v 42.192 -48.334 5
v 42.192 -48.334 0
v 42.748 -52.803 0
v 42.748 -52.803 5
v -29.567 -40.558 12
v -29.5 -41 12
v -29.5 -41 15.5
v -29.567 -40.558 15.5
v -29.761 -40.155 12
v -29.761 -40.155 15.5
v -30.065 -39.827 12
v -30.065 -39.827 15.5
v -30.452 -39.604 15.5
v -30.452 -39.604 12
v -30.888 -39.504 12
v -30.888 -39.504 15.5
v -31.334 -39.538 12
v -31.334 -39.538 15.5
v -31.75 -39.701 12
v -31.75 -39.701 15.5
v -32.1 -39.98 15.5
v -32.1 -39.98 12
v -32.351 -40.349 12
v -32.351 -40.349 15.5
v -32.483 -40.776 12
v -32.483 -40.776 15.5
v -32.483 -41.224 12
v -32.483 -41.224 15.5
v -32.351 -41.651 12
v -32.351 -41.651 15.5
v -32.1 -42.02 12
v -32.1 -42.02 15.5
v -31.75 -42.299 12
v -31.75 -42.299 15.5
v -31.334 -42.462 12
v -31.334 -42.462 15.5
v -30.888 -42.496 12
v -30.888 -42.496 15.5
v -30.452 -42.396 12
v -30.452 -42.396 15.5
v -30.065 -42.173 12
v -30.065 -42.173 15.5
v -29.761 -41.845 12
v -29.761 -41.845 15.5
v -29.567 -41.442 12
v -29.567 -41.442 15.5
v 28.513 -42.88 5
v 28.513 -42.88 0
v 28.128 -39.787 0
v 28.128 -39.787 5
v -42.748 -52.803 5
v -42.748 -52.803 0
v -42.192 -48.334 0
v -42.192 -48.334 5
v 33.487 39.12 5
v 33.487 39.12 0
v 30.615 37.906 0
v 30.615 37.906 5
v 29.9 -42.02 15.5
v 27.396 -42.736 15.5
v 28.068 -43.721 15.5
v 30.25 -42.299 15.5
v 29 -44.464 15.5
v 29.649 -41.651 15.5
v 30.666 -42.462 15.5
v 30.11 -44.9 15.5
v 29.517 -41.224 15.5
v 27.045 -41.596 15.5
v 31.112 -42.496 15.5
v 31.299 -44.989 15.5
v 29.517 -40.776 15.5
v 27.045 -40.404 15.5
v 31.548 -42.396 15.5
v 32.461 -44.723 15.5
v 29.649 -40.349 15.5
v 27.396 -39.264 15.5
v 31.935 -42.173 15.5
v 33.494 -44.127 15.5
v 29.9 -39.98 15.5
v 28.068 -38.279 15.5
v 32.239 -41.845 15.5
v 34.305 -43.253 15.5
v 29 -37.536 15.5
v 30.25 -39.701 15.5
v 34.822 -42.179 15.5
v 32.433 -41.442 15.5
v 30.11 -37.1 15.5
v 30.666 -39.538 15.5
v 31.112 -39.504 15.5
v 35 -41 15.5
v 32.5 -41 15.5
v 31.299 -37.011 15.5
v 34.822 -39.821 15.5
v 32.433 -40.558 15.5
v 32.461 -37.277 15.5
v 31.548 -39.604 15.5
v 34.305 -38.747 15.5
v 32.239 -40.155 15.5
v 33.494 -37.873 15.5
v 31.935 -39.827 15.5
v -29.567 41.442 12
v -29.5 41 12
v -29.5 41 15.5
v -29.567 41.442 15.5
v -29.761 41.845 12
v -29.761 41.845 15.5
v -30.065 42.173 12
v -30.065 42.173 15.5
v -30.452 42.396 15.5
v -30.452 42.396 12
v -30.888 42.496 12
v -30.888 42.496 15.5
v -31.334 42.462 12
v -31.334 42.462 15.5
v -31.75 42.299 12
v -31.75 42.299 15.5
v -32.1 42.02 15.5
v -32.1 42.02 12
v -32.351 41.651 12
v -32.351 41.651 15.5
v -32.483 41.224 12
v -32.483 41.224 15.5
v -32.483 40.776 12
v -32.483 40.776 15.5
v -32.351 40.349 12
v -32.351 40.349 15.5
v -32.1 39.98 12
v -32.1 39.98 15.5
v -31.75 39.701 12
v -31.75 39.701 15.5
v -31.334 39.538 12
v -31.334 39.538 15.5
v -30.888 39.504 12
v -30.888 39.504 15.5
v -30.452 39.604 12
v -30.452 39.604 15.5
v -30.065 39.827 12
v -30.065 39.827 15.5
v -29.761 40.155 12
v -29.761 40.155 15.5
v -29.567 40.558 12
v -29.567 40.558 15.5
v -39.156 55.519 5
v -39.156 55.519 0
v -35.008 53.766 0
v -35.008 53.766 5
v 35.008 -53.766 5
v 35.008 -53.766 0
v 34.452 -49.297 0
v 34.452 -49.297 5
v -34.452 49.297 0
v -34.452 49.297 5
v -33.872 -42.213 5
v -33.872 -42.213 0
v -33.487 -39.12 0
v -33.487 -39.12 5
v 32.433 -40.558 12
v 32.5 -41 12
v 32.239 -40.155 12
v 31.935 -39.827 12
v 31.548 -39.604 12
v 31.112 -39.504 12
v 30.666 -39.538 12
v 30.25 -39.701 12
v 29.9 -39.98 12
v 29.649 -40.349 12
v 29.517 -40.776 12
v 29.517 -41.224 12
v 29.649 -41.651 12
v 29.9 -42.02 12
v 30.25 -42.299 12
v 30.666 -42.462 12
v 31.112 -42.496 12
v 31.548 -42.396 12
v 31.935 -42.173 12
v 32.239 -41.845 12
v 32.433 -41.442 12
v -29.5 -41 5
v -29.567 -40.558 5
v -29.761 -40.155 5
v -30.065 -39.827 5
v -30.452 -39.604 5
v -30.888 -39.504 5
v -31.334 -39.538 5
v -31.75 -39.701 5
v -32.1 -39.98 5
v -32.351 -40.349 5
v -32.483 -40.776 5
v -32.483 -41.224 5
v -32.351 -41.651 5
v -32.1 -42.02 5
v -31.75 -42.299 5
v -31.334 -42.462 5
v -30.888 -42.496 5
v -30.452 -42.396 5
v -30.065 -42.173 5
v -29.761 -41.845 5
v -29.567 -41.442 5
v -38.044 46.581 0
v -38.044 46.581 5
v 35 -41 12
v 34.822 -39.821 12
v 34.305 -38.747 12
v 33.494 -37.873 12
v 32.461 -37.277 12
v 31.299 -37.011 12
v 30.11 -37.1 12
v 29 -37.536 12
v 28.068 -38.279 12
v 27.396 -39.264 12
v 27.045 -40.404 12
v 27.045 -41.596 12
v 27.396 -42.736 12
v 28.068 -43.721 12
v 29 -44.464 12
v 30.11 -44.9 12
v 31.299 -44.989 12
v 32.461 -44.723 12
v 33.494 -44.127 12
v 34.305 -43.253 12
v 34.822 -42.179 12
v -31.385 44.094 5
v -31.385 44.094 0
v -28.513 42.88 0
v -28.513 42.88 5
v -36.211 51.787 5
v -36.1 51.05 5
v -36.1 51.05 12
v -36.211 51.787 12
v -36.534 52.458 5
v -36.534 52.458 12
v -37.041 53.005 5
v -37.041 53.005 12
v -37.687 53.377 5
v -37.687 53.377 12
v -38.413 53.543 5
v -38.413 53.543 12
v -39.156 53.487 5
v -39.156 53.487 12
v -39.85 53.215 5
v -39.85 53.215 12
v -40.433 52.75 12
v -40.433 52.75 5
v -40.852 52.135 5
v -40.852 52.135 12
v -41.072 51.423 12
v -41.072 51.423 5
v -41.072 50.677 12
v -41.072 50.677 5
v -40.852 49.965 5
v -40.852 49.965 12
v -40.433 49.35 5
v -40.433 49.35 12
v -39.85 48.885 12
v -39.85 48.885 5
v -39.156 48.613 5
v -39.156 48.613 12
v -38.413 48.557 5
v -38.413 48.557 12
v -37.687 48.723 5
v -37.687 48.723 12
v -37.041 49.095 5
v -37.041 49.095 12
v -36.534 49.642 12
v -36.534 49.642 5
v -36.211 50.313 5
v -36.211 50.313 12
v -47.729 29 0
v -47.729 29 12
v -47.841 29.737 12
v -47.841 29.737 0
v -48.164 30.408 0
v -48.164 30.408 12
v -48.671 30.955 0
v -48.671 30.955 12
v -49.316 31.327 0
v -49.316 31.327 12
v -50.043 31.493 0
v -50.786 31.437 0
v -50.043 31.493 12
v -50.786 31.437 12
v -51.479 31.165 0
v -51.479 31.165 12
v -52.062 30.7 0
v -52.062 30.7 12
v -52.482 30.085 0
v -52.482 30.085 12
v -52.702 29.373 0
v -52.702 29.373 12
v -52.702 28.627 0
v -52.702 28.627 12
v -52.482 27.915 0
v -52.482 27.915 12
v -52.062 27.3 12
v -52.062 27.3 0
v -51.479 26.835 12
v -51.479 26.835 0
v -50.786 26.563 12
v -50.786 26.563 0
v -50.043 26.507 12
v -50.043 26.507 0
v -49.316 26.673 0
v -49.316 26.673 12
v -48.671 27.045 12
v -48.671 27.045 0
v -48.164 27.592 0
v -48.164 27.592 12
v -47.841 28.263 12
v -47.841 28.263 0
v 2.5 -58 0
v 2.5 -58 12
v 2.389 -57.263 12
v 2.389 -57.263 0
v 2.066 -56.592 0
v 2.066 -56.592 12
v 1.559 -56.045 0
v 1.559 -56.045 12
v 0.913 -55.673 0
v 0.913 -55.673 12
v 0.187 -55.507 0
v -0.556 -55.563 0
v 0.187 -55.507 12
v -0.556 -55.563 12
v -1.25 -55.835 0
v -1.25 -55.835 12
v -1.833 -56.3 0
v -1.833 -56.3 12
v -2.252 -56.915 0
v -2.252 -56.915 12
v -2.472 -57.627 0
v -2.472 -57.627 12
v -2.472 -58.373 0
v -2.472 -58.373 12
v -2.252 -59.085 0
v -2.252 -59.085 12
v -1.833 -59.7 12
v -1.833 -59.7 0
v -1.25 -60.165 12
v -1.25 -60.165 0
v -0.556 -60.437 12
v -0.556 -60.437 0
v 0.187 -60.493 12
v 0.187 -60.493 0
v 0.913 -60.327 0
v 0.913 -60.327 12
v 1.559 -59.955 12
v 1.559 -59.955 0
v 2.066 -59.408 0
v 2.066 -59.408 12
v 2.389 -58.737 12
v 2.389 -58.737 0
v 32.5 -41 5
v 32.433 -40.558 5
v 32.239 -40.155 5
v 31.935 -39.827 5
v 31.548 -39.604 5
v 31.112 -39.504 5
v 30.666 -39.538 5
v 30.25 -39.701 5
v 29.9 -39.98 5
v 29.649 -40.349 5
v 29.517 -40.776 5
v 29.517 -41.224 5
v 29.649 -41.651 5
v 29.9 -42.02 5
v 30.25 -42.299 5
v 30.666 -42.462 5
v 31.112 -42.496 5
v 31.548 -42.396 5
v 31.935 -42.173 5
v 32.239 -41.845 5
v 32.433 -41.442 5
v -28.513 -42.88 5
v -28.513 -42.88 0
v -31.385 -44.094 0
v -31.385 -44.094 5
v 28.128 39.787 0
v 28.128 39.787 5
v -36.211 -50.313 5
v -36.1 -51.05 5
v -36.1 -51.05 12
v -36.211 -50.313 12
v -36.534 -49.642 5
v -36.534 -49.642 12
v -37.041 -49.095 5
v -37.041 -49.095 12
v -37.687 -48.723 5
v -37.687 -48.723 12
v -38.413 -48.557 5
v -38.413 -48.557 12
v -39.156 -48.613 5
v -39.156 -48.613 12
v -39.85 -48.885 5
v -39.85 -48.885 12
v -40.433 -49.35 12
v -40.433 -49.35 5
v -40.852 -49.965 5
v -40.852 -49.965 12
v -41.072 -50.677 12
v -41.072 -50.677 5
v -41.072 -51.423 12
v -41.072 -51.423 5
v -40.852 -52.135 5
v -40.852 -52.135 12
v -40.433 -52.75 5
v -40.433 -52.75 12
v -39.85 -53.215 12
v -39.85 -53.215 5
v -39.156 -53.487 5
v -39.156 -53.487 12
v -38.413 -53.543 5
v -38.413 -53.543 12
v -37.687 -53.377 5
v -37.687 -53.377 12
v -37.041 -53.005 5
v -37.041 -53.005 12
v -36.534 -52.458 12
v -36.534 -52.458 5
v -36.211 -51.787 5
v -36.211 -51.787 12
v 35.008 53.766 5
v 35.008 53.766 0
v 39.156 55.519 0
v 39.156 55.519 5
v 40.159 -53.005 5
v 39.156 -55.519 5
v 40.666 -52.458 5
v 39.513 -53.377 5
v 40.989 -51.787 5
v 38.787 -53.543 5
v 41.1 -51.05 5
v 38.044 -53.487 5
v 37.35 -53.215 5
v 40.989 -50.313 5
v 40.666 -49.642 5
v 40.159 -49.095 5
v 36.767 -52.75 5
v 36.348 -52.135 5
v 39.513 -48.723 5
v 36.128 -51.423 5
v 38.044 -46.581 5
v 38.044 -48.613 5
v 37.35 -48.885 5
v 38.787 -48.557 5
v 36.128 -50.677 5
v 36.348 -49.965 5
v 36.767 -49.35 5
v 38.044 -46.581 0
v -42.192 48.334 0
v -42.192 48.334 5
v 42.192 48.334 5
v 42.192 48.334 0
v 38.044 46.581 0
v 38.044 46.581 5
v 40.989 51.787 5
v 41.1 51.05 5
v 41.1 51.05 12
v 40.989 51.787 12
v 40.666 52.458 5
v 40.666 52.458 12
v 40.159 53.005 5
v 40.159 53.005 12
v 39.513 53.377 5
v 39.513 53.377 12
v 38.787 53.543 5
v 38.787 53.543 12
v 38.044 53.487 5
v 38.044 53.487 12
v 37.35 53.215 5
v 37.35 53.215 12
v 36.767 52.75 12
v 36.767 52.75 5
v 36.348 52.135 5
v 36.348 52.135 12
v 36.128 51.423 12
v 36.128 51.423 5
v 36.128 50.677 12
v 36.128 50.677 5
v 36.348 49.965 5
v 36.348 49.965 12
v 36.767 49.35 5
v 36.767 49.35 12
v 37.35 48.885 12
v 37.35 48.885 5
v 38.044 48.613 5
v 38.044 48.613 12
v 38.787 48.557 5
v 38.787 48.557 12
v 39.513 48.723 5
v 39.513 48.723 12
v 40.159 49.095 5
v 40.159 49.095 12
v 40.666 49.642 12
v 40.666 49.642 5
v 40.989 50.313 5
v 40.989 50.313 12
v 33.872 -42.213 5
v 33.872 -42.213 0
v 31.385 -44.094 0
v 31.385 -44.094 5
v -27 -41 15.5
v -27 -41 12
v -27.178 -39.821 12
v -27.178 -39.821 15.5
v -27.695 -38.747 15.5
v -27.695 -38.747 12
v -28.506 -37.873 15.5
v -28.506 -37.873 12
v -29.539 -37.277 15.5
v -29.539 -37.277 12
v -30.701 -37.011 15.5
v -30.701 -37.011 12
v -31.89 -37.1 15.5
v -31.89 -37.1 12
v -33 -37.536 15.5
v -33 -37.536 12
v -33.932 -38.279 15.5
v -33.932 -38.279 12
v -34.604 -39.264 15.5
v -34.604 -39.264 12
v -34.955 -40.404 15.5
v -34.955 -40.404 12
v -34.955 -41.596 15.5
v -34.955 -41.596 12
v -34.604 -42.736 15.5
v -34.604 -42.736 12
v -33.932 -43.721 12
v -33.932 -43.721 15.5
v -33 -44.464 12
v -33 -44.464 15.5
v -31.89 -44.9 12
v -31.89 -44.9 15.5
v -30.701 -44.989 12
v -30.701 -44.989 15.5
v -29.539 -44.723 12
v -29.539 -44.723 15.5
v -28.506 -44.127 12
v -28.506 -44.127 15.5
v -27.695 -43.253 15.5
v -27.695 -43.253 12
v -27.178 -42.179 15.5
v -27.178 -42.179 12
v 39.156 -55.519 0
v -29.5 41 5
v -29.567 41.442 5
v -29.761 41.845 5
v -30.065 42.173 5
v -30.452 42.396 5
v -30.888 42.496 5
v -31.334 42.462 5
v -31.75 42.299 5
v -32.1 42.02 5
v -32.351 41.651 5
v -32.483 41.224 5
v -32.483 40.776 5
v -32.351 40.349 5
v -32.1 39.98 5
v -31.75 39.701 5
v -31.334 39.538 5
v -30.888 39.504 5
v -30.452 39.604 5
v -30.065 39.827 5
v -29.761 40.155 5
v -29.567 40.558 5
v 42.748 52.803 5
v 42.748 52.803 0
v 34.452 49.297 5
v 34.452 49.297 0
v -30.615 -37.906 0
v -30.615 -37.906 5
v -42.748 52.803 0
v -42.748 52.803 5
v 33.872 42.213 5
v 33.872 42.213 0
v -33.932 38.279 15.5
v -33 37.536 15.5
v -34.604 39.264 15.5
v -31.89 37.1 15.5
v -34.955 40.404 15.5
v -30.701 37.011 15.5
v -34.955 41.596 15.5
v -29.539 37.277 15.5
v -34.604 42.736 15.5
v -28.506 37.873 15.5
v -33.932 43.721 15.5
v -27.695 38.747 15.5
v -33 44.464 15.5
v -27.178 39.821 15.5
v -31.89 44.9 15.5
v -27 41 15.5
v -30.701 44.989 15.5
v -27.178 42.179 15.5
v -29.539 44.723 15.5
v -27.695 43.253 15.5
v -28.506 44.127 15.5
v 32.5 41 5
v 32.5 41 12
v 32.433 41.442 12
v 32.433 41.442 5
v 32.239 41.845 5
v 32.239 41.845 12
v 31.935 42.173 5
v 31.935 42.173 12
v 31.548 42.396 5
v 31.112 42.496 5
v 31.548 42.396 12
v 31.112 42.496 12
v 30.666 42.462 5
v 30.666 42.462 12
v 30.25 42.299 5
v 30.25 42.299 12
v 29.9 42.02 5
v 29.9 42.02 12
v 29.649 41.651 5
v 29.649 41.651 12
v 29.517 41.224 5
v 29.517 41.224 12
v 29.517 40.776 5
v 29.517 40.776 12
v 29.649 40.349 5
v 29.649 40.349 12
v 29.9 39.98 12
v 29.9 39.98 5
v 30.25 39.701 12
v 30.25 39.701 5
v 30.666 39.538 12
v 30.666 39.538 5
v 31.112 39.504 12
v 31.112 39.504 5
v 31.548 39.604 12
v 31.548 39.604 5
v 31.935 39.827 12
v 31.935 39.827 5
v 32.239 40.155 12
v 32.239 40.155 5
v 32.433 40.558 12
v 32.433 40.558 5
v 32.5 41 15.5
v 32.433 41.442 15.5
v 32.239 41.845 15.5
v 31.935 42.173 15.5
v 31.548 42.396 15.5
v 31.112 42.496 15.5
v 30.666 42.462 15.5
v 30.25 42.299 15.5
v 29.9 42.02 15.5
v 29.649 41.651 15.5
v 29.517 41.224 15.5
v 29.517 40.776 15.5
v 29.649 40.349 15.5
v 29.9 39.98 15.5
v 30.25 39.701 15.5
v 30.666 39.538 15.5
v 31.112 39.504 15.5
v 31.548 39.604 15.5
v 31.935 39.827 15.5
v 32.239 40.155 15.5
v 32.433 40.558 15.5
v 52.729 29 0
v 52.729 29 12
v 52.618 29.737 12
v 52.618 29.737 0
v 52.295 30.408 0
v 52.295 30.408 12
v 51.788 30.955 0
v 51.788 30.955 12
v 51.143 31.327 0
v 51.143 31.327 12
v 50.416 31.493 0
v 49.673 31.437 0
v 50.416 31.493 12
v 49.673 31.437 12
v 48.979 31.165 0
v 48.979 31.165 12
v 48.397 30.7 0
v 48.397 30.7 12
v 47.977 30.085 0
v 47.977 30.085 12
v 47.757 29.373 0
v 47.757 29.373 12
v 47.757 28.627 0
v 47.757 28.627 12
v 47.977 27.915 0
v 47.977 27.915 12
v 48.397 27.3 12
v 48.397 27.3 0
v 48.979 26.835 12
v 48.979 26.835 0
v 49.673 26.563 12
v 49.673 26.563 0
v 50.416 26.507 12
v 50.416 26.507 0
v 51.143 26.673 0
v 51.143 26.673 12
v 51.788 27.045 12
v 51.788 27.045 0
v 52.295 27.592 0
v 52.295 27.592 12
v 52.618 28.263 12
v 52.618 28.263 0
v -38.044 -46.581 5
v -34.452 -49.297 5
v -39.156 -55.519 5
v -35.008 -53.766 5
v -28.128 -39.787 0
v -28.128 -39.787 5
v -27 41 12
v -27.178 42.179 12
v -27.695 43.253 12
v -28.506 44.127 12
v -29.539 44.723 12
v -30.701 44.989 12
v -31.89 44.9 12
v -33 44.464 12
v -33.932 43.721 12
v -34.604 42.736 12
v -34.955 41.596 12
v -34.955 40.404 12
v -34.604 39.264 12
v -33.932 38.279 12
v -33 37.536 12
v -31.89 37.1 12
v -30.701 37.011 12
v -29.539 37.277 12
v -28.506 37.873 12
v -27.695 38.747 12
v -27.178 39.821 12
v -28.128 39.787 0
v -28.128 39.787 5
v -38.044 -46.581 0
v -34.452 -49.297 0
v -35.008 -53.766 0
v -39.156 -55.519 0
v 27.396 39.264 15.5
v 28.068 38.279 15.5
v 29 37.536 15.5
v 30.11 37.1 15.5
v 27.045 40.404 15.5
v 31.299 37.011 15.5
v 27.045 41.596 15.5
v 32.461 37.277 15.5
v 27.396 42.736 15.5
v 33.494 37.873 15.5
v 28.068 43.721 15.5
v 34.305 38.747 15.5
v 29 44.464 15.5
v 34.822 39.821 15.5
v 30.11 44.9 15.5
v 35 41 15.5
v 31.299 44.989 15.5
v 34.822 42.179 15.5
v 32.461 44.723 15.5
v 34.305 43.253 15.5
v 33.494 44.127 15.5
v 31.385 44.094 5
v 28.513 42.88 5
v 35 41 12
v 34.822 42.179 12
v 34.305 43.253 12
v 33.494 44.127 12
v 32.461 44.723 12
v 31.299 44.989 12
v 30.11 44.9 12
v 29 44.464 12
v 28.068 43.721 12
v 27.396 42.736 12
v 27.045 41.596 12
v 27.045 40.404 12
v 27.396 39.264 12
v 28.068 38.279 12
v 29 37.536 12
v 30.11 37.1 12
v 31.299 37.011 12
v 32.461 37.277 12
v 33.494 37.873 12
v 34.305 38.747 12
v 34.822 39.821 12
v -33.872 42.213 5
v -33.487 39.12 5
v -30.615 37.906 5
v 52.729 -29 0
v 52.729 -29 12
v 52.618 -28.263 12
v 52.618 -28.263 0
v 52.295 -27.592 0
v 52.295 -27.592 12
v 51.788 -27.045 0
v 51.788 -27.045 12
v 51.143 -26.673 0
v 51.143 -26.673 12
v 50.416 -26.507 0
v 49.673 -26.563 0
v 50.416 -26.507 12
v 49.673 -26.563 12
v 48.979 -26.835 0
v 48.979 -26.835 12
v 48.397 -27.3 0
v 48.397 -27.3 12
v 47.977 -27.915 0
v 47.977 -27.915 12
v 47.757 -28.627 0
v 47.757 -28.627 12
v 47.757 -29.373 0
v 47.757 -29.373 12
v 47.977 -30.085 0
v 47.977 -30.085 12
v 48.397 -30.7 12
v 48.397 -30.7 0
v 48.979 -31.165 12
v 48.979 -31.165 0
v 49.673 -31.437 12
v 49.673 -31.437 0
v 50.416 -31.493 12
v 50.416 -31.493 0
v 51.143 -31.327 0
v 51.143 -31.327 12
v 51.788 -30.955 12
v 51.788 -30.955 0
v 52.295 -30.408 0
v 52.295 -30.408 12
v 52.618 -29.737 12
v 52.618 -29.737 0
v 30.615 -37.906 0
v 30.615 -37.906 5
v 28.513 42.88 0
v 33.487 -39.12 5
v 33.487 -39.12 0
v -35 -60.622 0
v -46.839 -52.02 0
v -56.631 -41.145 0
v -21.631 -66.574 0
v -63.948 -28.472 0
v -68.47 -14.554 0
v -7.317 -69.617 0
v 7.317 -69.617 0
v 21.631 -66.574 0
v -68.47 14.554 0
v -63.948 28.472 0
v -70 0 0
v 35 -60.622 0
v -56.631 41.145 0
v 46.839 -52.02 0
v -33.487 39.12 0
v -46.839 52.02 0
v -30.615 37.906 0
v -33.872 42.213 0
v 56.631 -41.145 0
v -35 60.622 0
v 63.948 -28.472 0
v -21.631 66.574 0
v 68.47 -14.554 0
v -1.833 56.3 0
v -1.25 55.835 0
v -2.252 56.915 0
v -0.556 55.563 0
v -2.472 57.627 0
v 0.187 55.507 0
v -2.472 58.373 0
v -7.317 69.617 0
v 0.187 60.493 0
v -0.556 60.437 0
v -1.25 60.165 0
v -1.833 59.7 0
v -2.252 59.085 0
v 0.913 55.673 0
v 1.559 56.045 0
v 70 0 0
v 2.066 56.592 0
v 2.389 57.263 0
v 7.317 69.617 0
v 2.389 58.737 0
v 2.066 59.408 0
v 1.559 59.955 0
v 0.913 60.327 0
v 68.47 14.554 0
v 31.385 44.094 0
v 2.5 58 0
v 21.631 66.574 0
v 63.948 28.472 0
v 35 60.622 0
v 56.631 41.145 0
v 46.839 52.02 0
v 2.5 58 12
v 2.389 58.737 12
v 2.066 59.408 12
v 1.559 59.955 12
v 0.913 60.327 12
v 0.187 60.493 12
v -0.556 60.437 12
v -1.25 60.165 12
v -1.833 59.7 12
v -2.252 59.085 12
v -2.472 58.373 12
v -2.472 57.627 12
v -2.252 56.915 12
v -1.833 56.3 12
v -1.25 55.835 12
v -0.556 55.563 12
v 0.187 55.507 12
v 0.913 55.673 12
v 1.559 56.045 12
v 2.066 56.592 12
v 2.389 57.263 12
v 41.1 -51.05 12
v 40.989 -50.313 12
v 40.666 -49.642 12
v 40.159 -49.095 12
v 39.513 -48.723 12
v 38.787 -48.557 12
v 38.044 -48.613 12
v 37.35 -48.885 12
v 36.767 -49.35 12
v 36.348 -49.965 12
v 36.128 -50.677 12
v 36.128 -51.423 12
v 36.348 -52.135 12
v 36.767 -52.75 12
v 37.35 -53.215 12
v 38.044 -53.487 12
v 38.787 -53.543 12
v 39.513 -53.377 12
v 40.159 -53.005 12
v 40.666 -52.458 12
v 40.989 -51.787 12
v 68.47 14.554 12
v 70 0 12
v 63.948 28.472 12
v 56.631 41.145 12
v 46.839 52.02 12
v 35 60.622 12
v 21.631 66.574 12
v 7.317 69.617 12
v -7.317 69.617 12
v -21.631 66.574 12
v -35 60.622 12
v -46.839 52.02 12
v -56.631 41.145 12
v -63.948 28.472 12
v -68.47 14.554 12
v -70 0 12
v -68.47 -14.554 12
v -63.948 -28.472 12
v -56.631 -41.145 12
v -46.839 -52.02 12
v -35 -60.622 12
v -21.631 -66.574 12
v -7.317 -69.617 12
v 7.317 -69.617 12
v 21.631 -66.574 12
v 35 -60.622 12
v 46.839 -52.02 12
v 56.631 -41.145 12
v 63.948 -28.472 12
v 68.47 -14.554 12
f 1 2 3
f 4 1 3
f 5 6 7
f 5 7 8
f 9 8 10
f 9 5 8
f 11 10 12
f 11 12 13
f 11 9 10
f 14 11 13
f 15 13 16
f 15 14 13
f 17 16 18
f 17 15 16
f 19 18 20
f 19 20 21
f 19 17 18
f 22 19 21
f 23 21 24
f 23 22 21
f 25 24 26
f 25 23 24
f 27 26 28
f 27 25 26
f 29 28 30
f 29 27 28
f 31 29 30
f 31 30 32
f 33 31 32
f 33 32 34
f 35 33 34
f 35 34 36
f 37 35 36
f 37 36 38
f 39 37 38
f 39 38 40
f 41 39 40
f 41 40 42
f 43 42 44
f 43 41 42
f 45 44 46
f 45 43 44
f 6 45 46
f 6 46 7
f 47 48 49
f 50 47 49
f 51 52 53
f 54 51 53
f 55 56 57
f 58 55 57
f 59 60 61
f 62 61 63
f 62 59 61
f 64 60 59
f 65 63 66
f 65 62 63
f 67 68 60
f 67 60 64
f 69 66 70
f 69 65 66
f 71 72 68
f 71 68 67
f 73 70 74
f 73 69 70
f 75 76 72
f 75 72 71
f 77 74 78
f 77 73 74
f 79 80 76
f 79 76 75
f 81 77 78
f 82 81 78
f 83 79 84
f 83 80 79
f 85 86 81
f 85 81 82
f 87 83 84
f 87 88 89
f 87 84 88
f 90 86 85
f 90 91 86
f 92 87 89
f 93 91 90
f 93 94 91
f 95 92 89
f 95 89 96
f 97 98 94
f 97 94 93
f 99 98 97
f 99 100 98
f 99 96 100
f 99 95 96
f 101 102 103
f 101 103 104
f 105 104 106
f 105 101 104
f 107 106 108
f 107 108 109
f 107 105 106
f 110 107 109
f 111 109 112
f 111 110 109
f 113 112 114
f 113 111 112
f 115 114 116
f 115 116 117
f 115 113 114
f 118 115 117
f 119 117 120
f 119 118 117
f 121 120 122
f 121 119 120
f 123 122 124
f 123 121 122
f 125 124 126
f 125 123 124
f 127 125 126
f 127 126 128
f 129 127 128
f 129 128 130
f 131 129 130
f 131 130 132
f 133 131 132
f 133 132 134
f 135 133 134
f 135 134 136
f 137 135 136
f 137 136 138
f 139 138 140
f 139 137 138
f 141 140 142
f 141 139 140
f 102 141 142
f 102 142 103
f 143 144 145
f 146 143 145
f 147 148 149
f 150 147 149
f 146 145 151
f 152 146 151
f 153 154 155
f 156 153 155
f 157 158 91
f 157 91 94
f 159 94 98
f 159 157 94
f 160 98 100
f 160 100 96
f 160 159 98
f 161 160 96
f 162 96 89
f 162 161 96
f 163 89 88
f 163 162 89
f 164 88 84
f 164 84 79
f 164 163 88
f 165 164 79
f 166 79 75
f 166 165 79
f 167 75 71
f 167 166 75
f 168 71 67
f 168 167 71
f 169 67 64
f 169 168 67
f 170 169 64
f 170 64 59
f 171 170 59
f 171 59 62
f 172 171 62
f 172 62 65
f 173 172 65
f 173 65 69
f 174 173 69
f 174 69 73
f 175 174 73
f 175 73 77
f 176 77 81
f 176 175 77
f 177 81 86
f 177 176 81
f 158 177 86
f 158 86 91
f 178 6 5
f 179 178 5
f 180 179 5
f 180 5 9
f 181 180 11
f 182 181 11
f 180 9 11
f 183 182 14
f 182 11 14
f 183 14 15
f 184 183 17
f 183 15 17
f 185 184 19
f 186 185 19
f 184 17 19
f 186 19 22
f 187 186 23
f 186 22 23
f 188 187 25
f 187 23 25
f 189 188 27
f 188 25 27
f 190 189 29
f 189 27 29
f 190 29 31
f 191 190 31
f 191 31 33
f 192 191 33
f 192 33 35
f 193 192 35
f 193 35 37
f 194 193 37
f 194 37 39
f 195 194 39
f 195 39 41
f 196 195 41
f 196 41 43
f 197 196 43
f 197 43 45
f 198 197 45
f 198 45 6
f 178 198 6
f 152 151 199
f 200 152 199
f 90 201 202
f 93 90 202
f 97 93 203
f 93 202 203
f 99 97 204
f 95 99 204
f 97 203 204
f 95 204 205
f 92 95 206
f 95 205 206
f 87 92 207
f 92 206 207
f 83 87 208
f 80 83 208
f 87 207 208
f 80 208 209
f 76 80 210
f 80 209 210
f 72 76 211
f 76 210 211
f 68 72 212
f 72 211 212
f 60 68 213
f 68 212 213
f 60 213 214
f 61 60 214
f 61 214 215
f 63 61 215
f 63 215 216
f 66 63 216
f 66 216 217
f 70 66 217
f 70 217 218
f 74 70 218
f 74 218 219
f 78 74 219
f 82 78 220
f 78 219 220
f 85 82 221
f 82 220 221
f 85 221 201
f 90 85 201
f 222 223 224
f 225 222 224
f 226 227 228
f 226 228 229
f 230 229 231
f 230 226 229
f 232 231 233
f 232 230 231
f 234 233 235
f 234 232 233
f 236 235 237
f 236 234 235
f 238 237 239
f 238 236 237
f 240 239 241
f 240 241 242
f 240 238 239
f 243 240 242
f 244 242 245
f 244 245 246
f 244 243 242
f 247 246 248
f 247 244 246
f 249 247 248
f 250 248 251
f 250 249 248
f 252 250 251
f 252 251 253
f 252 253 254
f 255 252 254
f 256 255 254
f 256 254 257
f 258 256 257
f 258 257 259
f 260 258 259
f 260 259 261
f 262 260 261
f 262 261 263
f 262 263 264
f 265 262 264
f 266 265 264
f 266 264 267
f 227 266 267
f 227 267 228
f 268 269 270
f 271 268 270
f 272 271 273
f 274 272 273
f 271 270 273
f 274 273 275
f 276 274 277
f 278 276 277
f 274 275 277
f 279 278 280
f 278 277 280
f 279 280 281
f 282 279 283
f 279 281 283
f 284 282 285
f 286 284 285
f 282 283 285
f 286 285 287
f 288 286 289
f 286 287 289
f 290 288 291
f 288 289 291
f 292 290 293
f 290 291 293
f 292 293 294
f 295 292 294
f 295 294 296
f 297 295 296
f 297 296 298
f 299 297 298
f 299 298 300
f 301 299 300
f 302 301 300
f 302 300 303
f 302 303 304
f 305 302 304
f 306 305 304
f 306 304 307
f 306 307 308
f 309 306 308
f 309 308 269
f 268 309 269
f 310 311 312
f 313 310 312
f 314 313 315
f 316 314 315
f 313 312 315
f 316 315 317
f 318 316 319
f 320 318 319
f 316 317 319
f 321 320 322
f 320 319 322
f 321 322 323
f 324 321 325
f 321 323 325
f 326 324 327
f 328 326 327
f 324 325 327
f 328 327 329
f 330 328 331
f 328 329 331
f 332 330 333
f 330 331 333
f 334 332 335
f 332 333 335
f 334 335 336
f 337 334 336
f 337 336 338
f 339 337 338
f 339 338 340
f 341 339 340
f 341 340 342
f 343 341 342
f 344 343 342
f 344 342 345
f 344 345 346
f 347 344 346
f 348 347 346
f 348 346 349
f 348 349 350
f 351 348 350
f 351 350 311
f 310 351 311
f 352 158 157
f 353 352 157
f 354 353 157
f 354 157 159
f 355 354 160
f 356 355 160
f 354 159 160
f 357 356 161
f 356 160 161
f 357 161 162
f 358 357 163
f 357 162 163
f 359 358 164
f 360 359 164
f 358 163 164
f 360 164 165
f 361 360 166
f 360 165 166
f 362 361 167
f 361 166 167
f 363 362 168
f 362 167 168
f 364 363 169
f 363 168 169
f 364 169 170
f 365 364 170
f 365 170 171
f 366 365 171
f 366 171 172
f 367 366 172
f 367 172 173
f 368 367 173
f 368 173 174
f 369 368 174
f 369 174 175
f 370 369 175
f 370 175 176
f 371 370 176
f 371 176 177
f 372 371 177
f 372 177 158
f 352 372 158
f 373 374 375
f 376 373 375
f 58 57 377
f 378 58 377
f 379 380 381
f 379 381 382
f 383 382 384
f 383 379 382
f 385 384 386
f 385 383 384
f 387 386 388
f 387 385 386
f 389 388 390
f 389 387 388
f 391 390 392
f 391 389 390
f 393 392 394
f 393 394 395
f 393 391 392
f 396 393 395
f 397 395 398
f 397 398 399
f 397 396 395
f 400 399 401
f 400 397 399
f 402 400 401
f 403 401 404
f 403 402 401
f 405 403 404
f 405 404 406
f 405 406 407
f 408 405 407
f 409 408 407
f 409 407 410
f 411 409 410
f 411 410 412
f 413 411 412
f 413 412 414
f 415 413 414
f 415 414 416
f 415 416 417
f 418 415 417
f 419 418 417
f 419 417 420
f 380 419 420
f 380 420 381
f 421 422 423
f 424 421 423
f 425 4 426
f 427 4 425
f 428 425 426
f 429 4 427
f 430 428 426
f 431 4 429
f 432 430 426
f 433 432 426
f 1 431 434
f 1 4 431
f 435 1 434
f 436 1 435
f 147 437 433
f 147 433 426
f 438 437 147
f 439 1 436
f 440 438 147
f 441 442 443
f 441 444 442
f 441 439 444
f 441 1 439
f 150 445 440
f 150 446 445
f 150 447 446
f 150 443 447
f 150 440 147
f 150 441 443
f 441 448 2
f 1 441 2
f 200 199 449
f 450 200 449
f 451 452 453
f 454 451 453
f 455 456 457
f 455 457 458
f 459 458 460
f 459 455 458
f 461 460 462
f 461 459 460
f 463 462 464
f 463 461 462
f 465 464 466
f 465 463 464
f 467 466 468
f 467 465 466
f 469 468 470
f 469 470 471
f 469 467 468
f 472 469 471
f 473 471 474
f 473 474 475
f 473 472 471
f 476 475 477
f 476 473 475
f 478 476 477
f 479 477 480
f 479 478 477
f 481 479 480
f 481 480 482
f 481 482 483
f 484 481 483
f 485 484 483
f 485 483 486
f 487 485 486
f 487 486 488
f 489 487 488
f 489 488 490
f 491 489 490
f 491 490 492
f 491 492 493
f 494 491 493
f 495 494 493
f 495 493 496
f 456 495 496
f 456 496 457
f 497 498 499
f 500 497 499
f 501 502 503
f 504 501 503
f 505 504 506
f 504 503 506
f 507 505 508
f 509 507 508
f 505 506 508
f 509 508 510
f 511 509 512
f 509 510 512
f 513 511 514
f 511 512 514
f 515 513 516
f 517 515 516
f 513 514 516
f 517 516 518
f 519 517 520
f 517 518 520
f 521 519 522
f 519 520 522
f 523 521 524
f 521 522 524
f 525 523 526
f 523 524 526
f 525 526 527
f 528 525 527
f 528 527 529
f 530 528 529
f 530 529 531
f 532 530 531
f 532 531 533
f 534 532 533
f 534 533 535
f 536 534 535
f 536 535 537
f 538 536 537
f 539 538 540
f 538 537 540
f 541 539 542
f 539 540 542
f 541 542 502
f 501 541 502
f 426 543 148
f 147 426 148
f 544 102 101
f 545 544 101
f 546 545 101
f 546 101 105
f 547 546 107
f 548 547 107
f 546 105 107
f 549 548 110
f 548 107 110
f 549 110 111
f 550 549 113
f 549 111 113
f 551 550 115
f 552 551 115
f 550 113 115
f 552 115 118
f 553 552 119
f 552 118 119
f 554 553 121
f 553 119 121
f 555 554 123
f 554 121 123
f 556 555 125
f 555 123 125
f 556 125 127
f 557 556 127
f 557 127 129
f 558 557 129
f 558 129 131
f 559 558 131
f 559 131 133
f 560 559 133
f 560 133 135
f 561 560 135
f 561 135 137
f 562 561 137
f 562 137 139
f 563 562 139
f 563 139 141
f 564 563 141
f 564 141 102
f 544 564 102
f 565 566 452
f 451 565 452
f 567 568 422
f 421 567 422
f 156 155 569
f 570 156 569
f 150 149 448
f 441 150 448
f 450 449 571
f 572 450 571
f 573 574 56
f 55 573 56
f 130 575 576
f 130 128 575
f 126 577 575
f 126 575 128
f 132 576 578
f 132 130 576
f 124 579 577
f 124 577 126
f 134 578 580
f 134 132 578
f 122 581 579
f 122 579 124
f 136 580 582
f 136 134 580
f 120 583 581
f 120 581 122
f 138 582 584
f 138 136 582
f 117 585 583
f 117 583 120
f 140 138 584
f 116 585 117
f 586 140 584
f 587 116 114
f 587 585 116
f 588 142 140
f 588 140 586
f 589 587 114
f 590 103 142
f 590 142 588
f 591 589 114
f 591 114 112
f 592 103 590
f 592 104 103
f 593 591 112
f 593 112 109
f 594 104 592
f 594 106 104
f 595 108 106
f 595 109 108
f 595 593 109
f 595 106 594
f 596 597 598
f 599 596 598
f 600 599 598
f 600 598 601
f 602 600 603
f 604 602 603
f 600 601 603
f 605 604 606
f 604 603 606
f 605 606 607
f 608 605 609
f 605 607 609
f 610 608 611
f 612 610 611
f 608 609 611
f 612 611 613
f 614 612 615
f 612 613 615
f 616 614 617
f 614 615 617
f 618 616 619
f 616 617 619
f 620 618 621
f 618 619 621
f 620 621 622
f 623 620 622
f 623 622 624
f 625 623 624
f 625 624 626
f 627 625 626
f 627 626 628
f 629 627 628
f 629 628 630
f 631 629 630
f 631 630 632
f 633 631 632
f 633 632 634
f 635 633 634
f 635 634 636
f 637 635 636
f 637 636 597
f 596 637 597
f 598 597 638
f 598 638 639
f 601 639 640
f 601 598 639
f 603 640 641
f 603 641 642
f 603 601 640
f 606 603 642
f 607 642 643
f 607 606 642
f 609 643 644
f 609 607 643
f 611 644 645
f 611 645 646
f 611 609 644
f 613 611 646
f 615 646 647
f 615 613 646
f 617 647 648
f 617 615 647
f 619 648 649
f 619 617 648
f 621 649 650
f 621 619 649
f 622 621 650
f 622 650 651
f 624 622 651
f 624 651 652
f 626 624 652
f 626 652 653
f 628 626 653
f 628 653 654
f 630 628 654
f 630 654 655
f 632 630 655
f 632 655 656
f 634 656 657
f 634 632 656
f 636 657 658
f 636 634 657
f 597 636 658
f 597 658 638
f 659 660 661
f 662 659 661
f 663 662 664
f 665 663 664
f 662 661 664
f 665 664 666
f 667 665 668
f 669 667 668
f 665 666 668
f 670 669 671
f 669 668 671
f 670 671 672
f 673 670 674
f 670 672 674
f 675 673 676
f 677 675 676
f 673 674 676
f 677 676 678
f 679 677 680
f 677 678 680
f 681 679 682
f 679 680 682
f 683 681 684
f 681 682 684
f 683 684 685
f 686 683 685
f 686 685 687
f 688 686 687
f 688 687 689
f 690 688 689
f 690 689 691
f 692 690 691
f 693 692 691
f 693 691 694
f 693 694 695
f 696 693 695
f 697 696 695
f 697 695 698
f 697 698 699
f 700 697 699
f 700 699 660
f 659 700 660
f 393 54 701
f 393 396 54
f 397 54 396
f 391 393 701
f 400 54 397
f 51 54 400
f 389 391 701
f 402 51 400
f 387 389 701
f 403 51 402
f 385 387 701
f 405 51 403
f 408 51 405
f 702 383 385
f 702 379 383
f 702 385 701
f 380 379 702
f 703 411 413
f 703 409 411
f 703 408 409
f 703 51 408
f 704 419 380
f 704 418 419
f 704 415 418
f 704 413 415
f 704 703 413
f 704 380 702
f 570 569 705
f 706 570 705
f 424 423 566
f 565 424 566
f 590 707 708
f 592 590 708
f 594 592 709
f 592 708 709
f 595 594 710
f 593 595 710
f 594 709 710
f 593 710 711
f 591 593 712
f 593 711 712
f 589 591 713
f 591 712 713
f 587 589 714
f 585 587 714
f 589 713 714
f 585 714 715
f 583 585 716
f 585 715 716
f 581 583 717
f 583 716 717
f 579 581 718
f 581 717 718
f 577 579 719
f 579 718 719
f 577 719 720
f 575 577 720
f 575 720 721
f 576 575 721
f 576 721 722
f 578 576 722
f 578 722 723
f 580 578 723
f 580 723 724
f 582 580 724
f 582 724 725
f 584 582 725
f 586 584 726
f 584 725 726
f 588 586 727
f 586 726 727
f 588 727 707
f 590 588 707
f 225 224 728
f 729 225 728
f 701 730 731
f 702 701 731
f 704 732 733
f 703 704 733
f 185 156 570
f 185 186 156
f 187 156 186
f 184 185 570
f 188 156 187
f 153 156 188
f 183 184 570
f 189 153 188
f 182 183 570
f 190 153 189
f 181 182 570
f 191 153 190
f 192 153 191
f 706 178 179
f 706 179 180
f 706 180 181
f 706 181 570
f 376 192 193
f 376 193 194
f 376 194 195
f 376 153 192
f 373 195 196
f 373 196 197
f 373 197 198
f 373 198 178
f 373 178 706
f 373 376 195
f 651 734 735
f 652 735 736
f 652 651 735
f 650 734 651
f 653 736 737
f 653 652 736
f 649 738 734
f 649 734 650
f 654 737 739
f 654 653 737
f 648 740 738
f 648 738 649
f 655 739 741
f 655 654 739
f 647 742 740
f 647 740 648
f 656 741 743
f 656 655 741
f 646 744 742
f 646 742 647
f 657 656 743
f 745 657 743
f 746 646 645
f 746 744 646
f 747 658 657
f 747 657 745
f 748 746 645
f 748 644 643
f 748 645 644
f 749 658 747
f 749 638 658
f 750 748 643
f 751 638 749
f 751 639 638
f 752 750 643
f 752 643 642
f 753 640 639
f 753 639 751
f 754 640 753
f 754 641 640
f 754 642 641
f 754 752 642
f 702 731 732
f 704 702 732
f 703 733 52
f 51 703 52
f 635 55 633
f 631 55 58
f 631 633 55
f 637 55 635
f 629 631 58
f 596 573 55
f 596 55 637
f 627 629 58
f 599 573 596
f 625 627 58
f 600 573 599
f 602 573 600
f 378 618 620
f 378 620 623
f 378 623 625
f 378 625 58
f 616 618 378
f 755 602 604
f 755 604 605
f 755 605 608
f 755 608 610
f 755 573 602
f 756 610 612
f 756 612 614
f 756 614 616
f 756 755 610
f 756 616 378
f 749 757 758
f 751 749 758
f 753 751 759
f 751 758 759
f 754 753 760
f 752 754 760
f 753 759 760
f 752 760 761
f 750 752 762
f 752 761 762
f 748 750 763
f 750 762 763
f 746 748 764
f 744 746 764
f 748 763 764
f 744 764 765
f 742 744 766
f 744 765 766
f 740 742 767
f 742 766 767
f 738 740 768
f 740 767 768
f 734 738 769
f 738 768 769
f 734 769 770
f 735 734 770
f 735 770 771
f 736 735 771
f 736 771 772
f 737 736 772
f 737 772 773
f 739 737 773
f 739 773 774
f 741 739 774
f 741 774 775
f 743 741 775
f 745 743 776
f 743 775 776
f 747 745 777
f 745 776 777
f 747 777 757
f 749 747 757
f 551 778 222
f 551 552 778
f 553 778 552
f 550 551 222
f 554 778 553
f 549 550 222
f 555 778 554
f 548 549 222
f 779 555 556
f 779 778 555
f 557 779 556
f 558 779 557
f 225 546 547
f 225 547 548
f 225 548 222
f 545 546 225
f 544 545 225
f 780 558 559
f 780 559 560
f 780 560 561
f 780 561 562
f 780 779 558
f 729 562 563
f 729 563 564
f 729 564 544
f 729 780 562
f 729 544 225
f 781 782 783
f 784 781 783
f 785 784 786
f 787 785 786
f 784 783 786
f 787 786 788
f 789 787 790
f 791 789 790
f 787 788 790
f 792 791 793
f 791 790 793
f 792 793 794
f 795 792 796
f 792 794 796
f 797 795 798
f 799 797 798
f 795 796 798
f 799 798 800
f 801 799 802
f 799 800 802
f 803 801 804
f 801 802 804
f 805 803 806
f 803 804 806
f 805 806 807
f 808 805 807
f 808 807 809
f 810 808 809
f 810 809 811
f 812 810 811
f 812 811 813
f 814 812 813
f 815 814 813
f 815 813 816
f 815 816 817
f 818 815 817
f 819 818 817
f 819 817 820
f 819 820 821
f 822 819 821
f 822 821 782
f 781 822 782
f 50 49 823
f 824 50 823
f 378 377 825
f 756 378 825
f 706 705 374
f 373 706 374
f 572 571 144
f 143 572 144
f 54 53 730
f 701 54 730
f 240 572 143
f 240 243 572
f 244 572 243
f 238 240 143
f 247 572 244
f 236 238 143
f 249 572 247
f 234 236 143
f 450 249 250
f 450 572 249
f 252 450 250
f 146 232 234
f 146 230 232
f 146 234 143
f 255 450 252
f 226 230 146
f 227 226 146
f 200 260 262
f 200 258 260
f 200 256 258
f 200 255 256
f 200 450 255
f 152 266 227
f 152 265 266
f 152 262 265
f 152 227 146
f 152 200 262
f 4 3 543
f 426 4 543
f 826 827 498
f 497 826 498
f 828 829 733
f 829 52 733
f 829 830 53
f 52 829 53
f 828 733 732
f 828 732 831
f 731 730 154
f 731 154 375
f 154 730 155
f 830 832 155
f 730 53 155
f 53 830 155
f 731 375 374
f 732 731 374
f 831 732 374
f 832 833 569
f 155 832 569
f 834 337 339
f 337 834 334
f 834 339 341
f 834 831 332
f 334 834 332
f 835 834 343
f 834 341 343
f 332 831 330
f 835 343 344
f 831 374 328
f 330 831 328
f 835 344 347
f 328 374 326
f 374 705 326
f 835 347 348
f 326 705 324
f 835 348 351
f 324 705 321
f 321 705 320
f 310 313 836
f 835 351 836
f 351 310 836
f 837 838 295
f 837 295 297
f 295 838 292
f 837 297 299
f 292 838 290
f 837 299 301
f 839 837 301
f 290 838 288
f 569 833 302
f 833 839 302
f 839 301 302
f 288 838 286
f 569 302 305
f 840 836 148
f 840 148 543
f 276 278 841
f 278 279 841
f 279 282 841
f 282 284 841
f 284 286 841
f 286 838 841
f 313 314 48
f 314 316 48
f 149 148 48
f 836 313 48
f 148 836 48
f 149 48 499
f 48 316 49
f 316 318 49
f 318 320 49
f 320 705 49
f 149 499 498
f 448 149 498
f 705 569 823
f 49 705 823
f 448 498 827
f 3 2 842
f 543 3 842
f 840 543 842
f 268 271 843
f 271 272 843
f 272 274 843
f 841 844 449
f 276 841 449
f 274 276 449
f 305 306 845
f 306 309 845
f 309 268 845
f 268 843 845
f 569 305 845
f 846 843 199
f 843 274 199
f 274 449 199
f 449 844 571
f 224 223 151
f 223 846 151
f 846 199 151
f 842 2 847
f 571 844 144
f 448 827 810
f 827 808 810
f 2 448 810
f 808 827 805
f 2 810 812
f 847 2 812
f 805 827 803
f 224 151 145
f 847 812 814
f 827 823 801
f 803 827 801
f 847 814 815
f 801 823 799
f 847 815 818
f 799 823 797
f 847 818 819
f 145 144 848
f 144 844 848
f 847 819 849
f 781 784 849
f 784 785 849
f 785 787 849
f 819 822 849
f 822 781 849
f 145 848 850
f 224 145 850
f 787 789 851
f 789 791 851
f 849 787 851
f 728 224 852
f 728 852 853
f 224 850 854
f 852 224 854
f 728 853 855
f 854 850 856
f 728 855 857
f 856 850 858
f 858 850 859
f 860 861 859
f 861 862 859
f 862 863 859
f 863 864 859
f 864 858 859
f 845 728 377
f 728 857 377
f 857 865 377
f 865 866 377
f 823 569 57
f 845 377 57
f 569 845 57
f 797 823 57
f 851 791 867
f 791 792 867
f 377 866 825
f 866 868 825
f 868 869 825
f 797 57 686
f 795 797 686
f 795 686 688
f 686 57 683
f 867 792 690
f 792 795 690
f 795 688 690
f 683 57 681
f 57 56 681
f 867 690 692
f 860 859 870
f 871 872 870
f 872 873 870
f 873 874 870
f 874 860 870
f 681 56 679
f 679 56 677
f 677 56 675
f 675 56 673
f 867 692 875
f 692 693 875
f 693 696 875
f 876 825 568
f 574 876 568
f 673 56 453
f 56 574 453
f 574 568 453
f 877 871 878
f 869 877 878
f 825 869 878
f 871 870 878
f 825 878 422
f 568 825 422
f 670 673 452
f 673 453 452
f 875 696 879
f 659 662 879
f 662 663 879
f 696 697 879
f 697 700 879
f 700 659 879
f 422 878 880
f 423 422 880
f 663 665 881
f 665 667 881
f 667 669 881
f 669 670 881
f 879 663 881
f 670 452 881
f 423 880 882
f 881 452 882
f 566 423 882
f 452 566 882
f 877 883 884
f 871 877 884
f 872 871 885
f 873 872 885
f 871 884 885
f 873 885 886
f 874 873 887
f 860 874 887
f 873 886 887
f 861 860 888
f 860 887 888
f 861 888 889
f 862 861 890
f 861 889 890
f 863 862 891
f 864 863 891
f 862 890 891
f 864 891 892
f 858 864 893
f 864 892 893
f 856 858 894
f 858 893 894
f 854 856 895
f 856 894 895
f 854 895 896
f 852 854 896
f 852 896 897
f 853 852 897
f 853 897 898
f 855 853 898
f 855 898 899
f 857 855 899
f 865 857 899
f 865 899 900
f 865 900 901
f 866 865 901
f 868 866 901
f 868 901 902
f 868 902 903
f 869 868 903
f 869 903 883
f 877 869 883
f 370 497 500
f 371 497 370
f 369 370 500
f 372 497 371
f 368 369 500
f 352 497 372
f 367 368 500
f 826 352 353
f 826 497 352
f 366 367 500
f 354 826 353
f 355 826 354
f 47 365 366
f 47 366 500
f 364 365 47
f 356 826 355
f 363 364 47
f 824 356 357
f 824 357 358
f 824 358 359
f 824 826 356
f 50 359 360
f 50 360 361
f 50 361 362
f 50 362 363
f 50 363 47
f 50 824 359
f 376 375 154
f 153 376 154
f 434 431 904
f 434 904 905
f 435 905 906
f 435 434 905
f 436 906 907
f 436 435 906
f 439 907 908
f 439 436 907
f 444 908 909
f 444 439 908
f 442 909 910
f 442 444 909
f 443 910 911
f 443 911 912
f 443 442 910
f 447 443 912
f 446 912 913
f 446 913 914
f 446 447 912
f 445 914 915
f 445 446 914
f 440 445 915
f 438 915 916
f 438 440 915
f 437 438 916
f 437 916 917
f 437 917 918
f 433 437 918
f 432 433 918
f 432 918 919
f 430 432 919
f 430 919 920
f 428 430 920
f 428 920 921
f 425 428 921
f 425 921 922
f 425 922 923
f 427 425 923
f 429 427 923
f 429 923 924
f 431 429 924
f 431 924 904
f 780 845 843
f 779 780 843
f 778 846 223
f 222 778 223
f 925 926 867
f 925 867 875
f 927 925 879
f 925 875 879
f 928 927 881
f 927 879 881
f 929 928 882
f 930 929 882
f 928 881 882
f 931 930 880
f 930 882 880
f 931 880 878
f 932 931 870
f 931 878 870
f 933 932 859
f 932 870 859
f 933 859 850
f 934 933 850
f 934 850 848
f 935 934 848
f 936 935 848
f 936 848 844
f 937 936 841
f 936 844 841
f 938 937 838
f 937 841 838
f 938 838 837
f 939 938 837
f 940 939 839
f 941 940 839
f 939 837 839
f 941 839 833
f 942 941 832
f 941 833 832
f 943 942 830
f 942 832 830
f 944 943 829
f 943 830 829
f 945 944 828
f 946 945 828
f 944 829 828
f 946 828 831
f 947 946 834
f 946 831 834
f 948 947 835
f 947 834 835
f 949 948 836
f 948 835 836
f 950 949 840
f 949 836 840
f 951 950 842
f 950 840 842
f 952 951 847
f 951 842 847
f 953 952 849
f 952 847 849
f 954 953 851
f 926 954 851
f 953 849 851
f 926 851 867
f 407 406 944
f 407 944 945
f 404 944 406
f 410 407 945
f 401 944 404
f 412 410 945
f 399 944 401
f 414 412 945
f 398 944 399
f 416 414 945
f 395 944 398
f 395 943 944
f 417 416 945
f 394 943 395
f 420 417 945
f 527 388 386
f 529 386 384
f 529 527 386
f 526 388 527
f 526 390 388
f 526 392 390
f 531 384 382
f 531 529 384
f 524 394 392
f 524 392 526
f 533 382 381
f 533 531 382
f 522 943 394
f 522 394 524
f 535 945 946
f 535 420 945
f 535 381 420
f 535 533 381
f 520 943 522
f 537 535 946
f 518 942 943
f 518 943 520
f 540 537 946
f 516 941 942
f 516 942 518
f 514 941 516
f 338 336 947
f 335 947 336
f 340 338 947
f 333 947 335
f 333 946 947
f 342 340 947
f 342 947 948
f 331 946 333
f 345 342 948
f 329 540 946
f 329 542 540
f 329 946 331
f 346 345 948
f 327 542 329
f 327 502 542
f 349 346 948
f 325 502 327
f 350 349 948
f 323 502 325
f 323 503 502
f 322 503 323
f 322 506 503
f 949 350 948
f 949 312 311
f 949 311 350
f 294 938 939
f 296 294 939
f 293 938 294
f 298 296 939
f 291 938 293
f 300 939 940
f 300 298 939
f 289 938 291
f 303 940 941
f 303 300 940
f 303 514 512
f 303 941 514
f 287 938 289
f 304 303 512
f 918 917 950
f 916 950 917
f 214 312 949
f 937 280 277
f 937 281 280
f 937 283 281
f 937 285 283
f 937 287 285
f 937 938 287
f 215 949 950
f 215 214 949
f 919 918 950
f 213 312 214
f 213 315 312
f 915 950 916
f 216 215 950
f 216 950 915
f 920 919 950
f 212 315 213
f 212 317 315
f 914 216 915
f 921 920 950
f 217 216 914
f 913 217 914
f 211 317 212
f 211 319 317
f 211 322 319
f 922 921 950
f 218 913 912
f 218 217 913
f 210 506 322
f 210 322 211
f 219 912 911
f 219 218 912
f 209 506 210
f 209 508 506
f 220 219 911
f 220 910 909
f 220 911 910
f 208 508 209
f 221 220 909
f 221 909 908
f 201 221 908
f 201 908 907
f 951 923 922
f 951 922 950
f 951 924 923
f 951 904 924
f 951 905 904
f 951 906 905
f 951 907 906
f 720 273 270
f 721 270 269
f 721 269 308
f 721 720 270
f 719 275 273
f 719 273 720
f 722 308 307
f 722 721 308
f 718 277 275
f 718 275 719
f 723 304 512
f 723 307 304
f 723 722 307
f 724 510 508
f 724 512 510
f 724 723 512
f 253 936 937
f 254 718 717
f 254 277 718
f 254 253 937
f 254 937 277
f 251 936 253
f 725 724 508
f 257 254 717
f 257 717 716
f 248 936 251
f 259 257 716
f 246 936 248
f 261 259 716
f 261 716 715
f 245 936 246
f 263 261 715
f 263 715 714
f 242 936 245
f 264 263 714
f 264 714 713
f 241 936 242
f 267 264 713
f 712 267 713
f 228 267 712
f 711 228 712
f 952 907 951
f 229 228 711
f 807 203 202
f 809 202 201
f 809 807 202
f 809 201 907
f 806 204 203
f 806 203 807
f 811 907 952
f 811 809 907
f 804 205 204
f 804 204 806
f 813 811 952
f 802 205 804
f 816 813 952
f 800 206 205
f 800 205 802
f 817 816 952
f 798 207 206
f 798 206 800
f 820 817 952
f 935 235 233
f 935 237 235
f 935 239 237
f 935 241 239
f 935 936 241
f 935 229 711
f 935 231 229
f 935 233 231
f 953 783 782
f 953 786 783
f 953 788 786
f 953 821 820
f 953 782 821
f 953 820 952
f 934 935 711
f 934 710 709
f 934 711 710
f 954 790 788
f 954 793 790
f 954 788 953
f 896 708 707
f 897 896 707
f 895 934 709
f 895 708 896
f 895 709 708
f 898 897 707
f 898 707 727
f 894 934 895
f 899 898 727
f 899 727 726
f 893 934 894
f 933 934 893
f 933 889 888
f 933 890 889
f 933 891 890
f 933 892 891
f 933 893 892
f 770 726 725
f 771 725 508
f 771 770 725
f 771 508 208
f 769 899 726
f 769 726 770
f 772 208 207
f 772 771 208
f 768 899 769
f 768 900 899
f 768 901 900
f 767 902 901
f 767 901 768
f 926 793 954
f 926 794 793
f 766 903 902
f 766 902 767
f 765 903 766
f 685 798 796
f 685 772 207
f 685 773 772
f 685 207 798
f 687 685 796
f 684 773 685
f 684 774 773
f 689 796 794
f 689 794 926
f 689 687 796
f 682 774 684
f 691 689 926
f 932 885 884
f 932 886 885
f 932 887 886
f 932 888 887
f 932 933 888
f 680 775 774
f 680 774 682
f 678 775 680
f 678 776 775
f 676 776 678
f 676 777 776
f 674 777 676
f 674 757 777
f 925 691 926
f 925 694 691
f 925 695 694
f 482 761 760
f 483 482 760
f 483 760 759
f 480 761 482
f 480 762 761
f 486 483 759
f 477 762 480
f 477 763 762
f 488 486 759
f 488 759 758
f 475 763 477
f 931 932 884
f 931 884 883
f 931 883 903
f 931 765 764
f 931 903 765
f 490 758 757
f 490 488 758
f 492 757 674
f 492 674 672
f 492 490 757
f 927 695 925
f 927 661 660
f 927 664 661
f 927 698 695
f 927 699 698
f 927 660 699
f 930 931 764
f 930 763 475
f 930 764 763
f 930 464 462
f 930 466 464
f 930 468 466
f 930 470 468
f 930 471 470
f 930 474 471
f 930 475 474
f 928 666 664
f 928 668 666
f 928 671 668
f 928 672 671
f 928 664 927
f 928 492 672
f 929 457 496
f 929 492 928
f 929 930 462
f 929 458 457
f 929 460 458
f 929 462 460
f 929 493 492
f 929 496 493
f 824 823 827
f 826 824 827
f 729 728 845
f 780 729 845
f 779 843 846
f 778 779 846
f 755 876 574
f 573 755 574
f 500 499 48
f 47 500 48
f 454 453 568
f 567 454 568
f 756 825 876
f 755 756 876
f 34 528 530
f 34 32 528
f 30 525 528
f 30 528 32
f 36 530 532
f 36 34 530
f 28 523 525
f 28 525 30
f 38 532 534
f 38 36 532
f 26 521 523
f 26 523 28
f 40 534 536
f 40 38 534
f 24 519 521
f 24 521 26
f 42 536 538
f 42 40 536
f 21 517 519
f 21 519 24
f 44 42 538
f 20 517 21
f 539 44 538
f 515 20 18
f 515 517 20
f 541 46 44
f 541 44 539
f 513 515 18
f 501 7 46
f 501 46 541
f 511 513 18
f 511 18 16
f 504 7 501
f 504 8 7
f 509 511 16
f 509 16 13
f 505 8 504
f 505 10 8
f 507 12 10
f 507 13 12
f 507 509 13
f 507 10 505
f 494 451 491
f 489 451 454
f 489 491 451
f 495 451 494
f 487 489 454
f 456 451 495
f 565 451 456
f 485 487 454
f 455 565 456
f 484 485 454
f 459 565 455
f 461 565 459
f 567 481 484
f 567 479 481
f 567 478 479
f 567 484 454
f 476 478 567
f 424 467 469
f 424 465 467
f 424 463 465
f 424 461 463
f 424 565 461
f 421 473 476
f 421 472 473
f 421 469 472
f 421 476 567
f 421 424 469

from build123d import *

# Parameters (mm, degrees)
SKETCH_R           = 70
SKETCH_R_2         = 2.5
PAD_DEPTH          = 12
SKETCH001_R        = 1.5
POCKET_DEPTH       = 15
SKETCH002_R        = 4
SKETCH002_R_2      = 1.5
PAD001_DEPTH       = 3.5
SKETCH003_R        = 2.5
POCKET001_DEPTH    = 15
POCKET002_DEPTH    = 5
POLARPATTERN_COUNT = 2


with BuildPart() as part:
    # Sketch → Pad (new body)
    with BuildSketch(Plane.XY):
        Circle(SKETCH_R)
        with Locations((38.6, 51.05)):
            Circle(SKETCH_R_2, mode=Mode.SUBTRACT)
        with Locations((-38.6, 51.05)):
            Circle(SKETCH_R_2, mode=Mode.SUBTRACT)
        with Locations((38.6, -51.05)):
            Circle(SKETCH_R_2, mode=Mode.SUBTRACT)
        with Locations((-38.6, -51.05)):
            Circle(SKETCH_R_2, mode=Mode.SUBTRACT)
    extrude(amount=PAD_DEPTH)

    # Sketch001 (on Face7 of Pad) → Pocket (cut)
    with BuildSketch(Plane.XY.offset(12)):
        with Locations((-31, 41)):
            Circle(SKETCH001_R)
        with Locations((31, 41)):
            Circle(SKETCH001_R)
        with Locations((31, -41)):
            Circle(SKETCH001_R)
        with Locations((-31, -41)):
            Circle(SKETCH001_R)
    extrude(amount=-POCKET_DEPTH, mode=Mode.SUBTRACT)

    # Sketch002 (on Face3 of Pocket) → Pad001 (join)
    with BuildSketch(Plane.XY.offset(12)):
        with Locations((-31, -41)):
            Circle(SKETCH002_R)
        with Locations((-31, -41)):
            Circle(SKETCH002_R_2, mode=Mode.SUBTRACT)
        with Locations((31, -41)):
            Circle(SKETCH002_R)
        with Locations((31, -41)):
            Circle(SKETCH002_R_2, mode=Mode.SUBTRACT)
        with Locations((31, 41)):
            Circle(SKETCH002_R)
        with Locations((31, 41)):
            Circle(SKETCH002_R_2, mode=Mode.SUBTRACT)
        with Locations((-31, 41)):
            Circle(SKETCH002_R)
        with Locations((-31, 41)):
            Circle(SKETCH002_R_2, mode=Mode.SUBTRACT)
    extrude(amount=PAD001_DEPTH)

    # Sketch003 (on Face3 of Pad001) → Pocket001 (cut)
    with BuildSketch(Plane.XY.offset(12)):
        with Locations((0, 58)):
            Circle(SKETCH003_R)
        with Locations((50.229473, 29)):
            Circle(SKETCH003_R)
        with Locations((50.229473, -29)):
            Circle(SKETCH003_R)
        with Locations((0, -58)):
            Circle(SKETCH003_R)
        with Locations((-50.229473, 29)):
            Circle(SKETCH003_R)
    extrude(amount=-POCKET001_DEPTH, mode=Mode.SUBTRACT)

    # Sketch004 (on Face2 of Pocket001) → Pocket002 (cut)
    with BuildSketch(Plane(origin=(0, 0, 0), x_dir=(1, 0, 0), z_dir=(0, 0, -1))):
        Polygon((-35.008085, 53.766274), (-39.156405, 55.518827), (-42.74832, 52.802553), (-42.191915, 48.333726), (-38.043595, 46.581173), (-34.45168, 49.297447), align=None)
        Polygon((-28.513289, 42.880497), (-31.385203, 44.093803), (-33.871914, 42.213306), (-33.486711, 39.119503), (-30.614797, 37.906197), (-28.128086, 39.786694), align=None)
        Polygon((-35.008085, -53.766274), (-34.45168, -49.297447), (-38.043595, -46.581173), (-42.191915, -48.333726), (-42.74832, -52.802553), (-39.156405, -55.518827), align=None)
        Polygon((-28.513289, -42.880497), (-28.128086, -39.786694), (-30.614797, -37.906197), (-33.486711, -39.119503), (-33.871914, -42.213306), (-31.385203, -44.093803), align=None)
    pocket002 = extrude(amount=-POCKET002_DEPTH, mode=Mode.SUBTRACT)

    # PolarPattern: Pocket002 ×2 about axis
    polarpattern_axis = Axis((0, 0, 0), (0, 0, -1))
    for i in range(1, POLARPATTERN_COUNT):
        add(pocket002.rotate(polarpattern_axis, i * 360 / POLARPATTERN_COUNT), mode=Mode.SUBTRACT)


solid = part.part
